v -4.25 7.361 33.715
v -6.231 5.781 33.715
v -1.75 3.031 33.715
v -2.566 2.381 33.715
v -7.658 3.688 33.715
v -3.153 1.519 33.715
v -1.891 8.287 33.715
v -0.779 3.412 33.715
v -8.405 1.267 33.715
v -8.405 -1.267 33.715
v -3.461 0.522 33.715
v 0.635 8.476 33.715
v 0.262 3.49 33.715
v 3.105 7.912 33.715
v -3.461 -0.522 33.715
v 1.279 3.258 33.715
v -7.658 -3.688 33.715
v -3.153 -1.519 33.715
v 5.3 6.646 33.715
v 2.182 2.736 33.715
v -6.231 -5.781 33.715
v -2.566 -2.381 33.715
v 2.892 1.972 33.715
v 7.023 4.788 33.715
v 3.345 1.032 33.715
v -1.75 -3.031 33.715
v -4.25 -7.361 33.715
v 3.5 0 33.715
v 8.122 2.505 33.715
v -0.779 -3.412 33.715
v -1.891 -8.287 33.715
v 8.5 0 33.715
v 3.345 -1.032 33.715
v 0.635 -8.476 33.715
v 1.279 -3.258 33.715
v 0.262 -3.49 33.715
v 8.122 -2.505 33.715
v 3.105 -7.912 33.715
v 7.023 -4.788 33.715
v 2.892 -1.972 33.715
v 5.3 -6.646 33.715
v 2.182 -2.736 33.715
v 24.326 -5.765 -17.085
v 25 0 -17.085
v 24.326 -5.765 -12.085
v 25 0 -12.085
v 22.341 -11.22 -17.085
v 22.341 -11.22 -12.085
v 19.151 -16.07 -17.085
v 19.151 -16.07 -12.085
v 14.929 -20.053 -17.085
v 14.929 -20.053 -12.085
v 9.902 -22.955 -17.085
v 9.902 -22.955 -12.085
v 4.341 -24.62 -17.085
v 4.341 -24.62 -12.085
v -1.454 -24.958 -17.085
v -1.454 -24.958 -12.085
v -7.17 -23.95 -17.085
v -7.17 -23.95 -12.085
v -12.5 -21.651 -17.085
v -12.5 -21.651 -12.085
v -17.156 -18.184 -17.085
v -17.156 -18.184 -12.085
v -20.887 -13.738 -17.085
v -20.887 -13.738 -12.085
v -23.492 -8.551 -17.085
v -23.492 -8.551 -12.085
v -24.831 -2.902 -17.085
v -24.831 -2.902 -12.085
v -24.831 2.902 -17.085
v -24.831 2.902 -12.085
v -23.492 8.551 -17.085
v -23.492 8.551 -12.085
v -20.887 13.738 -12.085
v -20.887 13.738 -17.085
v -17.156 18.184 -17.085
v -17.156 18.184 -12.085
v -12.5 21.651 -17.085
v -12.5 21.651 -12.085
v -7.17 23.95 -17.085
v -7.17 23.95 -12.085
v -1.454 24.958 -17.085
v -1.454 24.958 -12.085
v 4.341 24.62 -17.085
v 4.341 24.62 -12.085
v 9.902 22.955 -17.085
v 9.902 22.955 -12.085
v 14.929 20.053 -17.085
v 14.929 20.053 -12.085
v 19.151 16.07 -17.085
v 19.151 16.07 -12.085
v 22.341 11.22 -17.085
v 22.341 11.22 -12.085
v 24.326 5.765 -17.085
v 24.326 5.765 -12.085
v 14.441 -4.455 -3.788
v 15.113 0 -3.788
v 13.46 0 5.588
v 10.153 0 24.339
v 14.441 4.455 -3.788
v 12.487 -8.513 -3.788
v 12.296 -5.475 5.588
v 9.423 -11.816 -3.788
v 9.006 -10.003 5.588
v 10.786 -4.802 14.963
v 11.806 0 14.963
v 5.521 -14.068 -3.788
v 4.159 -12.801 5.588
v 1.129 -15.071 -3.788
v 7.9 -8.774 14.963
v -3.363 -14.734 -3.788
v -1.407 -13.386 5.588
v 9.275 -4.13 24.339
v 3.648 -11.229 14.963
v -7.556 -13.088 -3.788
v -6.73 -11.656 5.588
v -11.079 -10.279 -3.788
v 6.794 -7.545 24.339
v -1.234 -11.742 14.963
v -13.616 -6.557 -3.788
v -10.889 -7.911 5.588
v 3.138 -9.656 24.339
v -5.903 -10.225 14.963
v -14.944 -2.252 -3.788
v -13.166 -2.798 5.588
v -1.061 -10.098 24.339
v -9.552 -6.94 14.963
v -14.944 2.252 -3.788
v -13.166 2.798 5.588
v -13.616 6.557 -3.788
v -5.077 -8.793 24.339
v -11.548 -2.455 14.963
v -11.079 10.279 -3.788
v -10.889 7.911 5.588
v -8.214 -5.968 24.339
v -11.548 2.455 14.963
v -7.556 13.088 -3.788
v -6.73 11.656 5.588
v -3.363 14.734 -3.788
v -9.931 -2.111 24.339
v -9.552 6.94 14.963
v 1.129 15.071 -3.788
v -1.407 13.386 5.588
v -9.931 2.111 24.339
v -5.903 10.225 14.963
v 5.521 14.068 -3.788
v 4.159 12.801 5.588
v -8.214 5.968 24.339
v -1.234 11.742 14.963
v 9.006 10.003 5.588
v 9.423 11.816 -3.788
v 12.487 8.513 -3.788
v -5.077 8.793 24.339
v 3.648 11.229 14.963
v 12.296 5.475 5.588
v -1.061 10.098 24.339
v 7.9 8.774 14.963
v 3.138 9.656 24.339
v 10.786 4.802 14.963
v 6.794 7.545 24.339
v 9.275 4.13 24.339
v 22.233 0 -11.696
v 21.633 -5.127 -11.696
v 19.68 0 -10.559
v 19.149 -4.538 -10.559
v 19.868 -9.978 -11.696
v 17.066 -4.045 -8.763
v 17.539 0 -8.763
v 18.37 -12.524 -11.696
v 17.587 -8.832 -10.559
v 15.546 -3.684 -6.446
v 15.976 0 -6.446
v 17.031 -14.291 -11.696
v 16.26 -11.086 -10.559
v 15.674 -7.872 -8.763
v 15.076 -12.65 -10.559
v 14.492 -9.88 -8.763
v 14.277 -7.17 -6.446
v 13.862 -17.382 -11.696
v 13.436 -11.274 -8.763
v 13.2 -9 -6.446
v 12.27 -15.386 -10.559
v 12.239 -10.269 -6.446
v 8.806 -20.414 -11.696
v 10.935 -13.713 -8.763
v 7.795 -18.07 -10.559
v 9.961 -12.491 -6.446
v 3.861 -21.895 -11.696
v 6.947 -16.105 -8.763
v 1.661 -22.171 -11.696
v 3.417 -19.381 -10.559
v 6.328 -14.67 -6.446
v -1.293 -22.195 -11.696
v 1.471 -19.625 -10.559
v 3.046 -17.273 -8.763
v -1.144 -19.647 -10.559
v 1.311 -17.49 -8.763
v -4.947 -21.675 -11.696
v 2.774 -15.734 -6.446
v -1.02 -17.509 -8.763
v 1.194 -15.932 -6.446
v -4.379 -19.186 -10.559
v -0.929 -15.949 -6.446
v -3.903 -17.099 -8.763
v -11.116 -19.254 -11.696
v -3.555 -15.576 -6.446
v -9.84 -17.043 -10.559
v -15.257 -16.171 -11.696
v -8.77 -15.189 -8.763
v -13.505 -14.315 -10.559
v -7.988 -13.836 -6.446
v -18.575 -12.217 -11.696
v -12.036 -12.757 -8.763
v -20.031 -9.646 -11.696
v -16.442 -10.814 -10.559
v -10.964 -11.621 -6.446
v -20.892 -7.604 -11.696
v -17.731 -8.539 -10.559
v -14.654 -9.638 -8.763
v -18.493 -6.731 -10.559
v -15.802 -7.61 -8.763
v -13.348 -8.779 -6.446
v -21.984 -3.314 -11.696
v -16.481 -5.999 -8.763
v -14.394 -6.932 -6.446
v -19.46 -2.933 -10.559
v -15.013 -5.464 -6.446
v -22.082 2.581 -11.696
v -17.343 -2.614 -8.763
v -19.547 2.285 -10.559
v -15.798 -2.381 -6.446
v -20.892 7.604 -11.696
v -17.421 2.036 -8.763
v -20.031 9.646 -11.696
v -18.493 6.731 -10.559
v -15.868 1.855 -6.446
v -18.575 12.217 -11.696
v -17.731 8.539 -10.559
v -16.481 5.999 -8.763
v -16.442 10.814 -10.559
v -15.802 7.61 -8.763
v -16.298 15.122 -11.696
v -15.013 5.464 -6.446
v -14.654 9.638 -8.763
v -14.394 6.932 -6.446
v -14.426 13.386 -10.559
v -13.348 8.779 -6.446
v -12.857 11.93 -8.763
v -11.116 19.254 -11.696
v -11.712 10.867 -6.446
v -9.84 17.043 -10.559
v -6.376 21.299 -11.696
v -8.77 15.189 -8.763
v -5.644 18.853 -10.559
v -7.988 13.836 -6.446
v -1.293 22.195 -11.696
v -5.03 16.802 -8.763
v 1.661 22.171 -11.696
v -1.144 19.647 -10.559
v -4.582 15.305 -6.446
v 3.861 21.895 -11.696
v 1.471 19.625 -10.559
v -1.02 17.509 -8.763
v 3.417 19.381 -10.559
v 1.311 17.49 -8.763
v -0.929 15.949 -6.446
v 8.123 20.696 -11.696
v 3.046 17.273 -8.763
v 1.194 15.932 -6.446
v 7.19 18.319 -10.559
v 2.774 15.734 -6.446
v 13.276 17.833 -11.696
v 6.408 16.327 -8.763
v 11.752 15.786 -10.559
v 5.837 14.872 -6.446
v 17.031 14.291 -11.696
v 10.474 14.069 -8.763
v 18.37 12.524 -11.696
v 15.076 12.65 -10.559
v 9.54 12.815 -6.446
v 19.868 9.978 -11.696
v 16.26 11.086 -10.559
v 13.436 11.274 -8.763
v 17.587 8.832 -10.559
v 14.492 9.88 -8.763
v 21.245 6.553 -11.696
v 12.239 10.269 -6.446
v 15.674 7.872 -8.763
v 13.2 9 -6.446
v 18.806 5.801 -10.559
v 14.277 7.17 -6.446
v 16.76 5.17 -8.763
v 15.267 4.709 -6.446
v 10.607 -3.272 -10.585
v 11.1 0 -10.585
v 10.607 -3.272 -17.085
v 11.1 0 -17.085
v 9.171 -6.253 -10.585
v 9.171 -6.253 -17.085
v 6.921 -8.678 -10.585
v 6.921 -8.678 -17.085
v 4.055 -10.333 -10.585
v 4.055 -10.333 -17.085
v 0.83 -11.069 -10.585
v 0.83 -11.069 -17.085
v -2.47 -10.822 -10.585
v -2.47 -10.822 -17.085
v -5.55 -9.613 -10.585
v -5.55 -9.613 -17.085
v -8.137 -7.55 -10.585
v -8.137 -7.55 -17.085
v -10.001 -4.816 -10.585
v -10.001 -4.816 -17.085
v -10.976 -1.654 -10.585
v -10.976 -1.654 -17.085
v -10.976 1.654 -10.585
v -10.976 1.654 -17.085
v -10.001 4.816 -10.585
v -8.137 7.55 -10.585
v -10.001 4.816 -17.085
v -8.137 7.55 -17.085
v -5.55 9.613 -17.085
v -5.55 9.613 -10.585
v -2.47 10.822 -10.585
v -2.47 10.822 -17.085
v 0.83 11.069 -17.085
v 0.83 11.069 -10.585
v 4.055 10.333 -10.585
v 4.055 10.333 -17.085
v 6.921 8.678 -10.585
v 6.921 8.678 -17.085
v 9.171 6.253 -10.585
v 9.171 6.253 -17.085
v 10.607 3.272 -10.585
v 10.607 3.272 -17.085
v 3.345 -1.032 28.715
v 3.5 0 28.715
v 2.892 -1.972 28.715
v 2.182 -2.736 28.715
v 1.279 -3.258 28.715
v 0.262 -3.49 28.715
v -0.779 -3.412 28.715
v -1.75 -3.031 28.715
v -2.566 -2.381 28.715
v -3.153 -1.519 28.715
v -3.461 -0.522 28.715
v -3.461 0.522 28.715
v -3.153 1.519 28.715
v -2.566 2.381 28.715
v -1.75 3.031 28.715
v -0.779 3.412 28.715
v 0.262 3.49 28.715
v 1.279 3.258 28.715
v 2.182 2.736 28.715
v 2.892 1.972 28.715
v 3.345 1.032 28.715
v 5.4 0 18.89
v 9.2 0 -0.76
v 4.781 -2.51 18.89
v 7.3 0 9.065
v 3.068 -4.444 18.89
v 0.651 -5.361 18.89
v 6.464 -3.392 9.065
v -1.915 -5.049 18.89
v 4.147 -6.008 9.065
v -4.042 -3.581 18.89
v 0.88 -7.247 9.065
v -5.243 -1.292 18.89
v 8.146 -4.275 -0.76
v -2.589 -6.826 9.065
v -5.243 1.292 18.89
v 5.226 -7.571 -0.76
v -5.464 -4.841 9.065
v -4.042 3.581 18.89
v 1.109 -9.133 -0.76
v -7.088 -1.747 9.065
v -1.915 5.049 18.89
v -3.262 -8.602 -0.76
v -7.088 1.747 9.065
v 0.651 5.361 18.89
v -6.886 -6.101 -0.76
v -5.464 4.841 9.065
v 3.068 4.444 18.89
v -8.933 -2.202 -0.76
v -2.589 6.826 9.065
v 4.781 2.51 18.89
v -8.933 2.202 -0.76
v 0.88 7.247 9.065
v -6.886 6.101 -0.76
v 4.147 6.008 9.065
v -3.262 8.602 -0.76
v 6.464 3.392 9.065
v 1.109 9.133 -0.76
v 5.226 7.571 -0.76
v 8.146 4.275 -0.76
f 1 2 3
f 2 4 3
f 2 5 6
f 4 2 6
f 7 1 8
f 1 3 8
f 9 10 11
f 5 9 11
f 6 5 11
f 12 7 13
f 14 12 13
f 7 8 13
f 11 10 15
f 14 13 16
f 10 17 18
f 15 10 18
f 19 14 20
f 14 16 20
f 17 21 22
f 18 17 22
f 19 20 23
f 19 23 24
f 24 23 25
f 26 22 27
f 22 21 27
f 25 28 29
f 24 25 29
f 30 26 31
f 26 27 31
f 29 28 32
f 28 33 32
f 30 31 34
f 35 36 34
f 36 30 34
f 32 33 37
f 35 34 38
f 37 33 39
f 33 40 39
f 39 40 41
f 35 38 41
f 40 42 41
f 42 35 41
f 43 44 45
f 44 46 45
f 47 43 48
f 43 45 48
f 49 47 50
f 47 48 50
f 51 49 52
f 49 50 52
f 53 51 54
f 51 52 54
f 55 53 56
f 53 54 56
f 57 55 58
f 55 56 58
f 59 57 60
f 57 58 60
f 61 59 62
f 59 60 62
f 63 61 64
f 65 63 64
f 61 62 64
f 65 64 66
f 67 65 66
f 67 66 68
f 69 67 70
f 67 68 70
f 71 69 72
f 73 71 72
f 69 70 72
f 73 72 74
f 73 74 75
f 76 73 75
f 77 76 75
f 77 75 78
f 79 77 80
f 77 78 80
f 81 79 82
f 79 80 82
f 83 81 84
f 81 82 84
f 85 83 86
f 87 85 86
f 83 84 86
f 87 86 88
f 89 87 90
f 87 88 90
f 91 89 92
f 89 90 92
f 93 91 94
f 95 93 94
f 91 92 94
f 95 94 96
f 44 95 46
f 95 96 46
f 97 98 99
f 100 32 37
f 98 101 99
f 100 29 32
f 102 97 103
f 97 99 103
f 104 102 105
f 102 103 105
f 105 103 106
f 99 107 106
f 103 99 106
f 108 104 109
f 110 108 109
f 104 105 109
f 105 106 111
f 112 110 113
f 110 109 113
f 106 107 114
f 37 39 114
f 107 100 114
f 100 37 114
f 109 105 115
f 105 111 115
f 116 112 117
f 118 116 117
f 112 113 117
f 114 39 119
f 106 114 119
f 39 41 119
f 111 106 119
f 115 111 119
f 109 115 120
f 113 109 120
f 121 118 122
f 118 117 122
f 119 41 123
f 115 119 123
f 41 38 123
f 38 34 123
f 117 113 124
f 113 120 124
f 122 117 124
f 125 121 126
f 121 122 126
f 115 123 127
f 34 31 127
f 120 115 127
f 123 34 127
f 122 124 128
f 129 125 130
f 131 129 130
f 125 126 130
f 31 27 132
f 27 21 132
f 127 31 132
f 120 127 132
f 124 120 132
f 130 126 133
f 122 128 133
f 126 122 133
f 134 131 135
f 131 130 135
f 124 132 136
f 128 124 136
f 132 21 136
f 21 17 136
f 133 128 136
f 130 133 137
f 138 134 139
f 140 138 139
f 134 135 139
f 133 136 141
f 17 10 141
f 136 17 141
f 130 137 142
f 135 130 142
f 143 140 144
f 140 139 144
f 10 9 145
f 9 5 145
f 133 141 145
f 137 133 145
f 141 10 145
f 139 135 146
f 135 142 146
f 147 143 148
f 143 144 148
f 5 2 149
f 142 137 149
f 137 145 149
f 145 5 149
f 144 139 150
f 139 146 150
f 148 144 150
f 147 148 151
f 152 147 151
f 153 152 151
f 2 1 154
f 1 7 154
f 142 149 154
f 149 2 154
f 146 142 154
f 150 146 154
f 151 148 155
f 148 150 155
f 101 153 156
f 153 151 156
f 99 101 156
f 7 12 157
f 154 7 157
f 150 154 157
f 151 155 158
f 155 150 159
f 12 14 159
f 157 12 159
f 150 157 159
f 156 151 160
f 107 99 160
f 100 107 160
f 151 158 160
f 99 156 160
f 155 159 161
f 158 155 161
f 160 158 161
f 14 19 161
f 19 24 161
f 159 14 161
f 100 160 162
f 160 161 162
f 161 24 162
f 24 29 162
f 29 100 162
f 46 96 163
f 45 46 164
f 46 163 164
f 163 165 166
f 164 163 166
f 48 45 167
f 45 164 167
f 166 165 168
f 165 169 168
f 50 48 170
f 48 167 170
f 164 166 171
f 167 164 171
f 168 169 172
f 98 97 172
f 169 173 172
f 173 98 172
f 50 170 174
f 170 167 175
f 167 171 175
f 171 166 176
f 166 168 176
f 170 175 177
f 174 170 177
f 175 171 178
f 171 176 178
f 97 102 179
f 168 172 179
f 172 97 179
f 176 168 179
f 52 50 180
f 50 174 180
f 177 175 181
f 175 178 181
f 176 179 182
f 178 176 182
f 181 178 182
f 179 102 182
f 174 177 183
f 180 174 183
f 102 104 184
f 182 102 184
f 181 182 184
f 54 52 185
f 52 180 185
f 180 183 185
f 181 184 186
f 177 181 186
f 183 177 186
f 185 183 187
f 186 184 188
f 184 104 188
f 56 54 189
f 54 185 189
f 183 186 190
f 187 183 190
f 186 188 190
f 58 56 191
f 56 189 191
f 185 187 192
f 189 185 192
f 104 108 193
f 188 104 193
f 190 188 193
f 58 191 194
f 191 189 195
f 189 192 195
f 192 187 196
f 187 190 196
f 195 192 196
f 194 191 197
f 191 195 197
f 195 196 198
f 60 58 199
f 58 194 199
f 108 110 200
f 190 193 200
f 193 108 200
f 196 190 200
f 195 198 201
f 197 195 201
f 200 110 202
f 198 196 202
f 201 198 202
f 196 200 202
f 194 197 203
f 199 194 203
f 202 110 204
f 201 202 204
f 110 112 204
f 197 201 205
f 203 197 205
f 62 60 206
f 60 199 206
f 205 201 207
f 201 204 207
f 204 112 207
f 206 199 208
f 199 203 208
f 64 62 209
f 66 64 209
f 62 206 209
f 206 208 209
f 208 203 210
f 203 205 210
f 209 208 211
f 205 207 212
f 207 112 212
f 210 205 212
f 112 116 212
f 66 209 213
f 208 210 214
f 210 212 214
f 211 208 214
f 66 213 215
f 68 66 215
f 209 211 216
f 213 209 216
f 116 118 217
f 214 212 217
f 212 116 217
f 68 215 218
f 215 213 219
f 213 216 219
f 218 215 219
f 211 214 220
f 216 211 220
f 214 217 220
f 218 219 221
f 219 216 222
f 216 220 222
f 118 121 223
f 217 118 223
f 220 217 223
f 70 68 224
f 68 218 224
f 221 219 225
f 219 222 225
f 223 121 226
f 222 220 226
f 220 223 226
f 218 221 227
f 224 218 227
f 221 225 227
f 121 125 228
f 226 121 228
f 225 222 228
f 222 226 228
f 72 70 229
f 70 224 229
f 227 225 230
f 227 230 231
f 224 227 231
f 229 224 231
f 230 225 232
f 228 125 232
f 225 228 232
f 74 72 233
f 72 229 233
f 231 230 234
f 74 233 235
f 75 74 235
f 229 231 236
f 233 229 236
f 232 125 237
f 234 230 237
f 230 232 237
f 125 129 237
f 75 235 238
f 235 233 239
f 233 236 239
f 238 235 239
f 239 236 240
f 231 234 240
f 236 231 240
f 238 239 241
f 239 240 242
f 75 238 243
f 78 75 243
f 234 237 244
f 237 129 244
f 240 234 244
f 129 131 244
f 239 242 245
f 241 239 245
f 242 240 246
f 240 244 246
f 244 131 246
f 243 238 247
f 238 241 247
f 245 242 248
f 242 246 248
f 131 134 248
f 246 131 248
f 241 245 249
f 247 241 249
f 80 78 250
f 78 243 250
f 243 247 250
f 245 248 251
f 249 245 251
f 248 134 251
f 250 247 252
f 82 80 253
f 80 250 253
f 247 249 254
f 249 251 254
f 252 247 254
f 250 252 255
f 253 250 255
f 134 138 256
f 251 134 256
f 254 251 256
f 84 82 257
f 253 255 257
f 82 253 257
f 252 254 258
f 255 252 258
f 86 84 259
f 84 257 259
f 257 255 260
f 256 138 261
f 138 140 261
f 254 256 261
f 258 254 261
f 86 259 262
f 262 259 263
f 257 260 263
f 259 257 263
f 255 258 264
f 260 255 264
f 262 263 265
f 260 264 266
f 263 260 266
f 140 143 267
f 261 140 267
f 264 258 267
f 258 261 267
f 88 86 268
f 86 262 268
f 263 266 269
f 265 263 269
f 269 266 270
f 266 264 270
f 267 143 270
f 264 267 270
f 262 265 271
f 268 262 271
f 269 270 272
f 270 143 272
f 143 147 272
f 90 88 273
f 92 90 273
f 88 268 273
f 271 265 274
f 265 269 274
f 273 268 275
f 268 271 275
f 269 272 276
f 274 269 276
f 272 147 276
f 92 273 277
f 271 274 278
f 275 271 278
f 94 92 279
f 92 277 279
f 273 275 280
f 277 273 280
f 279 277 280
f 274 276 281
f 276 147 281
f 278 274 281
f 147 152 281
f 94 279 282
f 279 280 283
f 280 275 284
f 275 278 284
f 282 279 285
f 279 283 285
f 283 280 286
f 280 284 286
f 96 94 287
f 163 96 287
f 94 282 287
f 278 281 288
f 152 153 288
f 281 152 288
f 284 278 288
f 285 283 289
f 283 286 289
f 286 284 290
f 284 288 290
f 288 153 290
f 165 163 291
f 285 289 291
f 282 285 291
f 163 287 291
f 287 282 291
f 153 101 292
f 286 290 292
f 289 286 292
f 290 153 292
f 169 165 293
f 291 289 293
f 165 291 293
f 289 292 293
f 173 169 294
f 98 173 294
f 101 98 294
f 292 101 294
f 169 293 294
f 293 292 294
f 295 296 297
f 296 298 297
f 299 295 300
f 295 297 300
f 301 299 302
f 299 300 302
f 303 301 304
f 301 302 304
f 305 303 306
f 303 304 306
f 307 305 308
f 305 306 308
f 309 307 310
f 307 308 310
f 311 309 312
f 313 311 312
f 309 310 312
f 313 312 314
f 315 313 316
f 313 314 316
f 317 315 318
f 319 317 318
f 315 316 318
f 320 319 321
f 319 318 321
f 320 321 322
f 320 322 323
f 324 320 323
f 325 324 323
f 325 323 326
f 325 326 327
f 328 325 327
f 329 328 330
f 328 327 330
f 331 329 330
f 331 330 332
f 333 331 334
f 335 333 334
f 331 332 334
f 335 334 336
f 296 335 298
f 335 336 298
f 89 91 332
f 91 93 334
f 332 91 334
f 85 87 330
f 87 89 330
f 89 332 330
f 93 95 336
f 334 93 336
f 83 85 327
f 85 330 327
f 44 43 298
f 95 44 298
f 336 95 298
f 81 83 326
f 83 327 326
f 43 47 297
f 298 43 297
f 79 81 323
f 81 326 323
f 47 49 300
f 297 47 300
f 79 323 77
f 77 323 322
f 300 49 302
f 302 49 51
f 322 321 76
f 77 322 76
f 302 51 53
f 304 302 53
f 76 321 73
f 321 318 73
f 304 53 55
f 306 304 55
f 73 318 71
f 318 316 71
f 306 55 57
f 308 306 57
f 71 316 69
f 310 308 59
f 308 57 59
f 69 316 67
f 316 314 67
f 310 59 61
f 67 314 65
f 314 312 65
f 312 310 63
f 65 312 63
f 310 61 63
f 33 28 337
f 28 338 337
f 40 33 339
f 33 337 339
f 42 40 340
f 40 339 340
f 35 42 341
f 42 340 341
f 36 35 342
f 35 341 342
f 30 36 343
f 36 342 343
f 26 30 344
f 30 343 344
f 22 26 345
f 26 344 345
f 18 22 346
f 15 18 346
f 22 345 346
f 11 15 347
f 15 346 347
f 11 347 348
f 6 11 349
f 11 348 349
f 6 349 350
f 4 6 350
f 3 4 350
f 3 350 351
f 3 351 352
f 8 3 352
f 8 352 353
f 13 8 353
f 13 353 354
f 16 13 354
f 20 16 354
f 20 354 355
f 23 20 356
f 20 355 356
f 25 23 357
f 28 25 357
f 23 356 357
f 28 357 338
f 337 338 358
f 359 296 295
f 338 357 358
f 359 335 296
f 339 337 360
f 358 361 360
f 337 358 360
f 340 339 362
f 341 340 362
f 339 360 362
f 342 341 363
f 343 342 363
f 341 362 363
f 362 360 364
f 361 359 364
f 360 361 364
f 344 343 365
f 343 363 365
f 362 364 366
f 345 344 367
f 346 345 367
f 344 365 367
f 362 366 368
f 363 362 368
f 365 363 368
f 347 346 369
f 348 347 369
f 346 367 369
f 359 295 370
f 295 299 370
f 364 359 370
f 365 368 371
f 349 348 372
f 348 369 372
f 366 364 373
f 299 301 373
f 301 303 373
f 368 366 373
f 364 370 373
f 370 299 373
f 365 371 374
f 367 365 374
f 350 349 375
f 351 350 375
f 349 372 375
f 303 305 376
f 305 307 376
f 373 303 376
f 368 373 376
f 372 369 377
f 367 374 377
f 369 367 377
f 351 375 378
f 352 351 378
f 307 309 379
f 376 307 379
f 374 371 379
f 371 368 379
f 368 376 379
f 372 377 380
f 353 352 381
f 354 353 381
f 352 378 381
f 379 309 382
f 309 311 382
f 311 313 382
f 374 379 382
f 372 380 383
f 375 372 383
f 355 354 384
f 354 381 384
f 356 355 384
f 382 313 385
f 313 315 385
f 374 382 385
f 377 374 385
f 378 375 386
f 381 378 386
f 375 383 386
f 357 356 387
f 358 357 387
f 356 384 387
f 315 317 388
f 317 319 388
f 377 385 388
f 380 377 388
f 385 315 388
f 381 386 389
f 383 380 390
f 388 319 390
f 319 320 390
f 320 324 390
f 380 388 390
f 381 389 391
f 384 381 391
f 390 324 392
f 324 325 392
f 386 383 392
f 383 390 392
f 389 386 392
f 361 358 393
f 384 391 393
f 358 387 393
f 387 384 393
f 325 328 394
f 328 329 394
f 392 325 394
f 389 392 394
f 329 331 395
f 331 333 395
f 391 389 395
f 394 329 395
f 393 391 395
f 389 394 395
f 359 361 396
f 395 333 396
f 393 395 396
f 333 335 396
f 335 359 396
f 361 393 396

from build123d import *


with BuildPart() as part:
    # Sketch1 → Revolve1 (revolve)
    with BuildSketch(Plane(origin=(0, 0, 0), x_dir=(0, 0, -1), z_dir=(1, 0, 0)), mode=Mode.PRIVATE) as revolve1_sk:
        with BuildLine():
            Line((-33.715360463, 3.5), (-28.715360463, 3.5))
            Line((-28.715360463, 3.5), (10.584639537, 11.1))
            Line((10.584639537, 11.1), (17.084639537, 11.1))
            Line((17.084639537, 11.1), (17.084639537, 25))
            Line((17.084639537, 25), (12.084639537, 25))
            ThreePointArc((12.084639537, 25), (9.735819432, 18.5466698), (3.788398149, 15.112924521))
            Line((3.788398149, 15.112924521), (-33.715360463, 8.5))
            Line((-33.715360463, 8.5), (-33.715360463, 3.5))
        make_face()
    revolve(revolve1_sk.sketch.rotate(Axis((0, 0, 51.495497957), (0, 0, -1)), 90), axis=Axis((0, 0, 51.495497957), (0, 0, -1)))


solid = part.part
